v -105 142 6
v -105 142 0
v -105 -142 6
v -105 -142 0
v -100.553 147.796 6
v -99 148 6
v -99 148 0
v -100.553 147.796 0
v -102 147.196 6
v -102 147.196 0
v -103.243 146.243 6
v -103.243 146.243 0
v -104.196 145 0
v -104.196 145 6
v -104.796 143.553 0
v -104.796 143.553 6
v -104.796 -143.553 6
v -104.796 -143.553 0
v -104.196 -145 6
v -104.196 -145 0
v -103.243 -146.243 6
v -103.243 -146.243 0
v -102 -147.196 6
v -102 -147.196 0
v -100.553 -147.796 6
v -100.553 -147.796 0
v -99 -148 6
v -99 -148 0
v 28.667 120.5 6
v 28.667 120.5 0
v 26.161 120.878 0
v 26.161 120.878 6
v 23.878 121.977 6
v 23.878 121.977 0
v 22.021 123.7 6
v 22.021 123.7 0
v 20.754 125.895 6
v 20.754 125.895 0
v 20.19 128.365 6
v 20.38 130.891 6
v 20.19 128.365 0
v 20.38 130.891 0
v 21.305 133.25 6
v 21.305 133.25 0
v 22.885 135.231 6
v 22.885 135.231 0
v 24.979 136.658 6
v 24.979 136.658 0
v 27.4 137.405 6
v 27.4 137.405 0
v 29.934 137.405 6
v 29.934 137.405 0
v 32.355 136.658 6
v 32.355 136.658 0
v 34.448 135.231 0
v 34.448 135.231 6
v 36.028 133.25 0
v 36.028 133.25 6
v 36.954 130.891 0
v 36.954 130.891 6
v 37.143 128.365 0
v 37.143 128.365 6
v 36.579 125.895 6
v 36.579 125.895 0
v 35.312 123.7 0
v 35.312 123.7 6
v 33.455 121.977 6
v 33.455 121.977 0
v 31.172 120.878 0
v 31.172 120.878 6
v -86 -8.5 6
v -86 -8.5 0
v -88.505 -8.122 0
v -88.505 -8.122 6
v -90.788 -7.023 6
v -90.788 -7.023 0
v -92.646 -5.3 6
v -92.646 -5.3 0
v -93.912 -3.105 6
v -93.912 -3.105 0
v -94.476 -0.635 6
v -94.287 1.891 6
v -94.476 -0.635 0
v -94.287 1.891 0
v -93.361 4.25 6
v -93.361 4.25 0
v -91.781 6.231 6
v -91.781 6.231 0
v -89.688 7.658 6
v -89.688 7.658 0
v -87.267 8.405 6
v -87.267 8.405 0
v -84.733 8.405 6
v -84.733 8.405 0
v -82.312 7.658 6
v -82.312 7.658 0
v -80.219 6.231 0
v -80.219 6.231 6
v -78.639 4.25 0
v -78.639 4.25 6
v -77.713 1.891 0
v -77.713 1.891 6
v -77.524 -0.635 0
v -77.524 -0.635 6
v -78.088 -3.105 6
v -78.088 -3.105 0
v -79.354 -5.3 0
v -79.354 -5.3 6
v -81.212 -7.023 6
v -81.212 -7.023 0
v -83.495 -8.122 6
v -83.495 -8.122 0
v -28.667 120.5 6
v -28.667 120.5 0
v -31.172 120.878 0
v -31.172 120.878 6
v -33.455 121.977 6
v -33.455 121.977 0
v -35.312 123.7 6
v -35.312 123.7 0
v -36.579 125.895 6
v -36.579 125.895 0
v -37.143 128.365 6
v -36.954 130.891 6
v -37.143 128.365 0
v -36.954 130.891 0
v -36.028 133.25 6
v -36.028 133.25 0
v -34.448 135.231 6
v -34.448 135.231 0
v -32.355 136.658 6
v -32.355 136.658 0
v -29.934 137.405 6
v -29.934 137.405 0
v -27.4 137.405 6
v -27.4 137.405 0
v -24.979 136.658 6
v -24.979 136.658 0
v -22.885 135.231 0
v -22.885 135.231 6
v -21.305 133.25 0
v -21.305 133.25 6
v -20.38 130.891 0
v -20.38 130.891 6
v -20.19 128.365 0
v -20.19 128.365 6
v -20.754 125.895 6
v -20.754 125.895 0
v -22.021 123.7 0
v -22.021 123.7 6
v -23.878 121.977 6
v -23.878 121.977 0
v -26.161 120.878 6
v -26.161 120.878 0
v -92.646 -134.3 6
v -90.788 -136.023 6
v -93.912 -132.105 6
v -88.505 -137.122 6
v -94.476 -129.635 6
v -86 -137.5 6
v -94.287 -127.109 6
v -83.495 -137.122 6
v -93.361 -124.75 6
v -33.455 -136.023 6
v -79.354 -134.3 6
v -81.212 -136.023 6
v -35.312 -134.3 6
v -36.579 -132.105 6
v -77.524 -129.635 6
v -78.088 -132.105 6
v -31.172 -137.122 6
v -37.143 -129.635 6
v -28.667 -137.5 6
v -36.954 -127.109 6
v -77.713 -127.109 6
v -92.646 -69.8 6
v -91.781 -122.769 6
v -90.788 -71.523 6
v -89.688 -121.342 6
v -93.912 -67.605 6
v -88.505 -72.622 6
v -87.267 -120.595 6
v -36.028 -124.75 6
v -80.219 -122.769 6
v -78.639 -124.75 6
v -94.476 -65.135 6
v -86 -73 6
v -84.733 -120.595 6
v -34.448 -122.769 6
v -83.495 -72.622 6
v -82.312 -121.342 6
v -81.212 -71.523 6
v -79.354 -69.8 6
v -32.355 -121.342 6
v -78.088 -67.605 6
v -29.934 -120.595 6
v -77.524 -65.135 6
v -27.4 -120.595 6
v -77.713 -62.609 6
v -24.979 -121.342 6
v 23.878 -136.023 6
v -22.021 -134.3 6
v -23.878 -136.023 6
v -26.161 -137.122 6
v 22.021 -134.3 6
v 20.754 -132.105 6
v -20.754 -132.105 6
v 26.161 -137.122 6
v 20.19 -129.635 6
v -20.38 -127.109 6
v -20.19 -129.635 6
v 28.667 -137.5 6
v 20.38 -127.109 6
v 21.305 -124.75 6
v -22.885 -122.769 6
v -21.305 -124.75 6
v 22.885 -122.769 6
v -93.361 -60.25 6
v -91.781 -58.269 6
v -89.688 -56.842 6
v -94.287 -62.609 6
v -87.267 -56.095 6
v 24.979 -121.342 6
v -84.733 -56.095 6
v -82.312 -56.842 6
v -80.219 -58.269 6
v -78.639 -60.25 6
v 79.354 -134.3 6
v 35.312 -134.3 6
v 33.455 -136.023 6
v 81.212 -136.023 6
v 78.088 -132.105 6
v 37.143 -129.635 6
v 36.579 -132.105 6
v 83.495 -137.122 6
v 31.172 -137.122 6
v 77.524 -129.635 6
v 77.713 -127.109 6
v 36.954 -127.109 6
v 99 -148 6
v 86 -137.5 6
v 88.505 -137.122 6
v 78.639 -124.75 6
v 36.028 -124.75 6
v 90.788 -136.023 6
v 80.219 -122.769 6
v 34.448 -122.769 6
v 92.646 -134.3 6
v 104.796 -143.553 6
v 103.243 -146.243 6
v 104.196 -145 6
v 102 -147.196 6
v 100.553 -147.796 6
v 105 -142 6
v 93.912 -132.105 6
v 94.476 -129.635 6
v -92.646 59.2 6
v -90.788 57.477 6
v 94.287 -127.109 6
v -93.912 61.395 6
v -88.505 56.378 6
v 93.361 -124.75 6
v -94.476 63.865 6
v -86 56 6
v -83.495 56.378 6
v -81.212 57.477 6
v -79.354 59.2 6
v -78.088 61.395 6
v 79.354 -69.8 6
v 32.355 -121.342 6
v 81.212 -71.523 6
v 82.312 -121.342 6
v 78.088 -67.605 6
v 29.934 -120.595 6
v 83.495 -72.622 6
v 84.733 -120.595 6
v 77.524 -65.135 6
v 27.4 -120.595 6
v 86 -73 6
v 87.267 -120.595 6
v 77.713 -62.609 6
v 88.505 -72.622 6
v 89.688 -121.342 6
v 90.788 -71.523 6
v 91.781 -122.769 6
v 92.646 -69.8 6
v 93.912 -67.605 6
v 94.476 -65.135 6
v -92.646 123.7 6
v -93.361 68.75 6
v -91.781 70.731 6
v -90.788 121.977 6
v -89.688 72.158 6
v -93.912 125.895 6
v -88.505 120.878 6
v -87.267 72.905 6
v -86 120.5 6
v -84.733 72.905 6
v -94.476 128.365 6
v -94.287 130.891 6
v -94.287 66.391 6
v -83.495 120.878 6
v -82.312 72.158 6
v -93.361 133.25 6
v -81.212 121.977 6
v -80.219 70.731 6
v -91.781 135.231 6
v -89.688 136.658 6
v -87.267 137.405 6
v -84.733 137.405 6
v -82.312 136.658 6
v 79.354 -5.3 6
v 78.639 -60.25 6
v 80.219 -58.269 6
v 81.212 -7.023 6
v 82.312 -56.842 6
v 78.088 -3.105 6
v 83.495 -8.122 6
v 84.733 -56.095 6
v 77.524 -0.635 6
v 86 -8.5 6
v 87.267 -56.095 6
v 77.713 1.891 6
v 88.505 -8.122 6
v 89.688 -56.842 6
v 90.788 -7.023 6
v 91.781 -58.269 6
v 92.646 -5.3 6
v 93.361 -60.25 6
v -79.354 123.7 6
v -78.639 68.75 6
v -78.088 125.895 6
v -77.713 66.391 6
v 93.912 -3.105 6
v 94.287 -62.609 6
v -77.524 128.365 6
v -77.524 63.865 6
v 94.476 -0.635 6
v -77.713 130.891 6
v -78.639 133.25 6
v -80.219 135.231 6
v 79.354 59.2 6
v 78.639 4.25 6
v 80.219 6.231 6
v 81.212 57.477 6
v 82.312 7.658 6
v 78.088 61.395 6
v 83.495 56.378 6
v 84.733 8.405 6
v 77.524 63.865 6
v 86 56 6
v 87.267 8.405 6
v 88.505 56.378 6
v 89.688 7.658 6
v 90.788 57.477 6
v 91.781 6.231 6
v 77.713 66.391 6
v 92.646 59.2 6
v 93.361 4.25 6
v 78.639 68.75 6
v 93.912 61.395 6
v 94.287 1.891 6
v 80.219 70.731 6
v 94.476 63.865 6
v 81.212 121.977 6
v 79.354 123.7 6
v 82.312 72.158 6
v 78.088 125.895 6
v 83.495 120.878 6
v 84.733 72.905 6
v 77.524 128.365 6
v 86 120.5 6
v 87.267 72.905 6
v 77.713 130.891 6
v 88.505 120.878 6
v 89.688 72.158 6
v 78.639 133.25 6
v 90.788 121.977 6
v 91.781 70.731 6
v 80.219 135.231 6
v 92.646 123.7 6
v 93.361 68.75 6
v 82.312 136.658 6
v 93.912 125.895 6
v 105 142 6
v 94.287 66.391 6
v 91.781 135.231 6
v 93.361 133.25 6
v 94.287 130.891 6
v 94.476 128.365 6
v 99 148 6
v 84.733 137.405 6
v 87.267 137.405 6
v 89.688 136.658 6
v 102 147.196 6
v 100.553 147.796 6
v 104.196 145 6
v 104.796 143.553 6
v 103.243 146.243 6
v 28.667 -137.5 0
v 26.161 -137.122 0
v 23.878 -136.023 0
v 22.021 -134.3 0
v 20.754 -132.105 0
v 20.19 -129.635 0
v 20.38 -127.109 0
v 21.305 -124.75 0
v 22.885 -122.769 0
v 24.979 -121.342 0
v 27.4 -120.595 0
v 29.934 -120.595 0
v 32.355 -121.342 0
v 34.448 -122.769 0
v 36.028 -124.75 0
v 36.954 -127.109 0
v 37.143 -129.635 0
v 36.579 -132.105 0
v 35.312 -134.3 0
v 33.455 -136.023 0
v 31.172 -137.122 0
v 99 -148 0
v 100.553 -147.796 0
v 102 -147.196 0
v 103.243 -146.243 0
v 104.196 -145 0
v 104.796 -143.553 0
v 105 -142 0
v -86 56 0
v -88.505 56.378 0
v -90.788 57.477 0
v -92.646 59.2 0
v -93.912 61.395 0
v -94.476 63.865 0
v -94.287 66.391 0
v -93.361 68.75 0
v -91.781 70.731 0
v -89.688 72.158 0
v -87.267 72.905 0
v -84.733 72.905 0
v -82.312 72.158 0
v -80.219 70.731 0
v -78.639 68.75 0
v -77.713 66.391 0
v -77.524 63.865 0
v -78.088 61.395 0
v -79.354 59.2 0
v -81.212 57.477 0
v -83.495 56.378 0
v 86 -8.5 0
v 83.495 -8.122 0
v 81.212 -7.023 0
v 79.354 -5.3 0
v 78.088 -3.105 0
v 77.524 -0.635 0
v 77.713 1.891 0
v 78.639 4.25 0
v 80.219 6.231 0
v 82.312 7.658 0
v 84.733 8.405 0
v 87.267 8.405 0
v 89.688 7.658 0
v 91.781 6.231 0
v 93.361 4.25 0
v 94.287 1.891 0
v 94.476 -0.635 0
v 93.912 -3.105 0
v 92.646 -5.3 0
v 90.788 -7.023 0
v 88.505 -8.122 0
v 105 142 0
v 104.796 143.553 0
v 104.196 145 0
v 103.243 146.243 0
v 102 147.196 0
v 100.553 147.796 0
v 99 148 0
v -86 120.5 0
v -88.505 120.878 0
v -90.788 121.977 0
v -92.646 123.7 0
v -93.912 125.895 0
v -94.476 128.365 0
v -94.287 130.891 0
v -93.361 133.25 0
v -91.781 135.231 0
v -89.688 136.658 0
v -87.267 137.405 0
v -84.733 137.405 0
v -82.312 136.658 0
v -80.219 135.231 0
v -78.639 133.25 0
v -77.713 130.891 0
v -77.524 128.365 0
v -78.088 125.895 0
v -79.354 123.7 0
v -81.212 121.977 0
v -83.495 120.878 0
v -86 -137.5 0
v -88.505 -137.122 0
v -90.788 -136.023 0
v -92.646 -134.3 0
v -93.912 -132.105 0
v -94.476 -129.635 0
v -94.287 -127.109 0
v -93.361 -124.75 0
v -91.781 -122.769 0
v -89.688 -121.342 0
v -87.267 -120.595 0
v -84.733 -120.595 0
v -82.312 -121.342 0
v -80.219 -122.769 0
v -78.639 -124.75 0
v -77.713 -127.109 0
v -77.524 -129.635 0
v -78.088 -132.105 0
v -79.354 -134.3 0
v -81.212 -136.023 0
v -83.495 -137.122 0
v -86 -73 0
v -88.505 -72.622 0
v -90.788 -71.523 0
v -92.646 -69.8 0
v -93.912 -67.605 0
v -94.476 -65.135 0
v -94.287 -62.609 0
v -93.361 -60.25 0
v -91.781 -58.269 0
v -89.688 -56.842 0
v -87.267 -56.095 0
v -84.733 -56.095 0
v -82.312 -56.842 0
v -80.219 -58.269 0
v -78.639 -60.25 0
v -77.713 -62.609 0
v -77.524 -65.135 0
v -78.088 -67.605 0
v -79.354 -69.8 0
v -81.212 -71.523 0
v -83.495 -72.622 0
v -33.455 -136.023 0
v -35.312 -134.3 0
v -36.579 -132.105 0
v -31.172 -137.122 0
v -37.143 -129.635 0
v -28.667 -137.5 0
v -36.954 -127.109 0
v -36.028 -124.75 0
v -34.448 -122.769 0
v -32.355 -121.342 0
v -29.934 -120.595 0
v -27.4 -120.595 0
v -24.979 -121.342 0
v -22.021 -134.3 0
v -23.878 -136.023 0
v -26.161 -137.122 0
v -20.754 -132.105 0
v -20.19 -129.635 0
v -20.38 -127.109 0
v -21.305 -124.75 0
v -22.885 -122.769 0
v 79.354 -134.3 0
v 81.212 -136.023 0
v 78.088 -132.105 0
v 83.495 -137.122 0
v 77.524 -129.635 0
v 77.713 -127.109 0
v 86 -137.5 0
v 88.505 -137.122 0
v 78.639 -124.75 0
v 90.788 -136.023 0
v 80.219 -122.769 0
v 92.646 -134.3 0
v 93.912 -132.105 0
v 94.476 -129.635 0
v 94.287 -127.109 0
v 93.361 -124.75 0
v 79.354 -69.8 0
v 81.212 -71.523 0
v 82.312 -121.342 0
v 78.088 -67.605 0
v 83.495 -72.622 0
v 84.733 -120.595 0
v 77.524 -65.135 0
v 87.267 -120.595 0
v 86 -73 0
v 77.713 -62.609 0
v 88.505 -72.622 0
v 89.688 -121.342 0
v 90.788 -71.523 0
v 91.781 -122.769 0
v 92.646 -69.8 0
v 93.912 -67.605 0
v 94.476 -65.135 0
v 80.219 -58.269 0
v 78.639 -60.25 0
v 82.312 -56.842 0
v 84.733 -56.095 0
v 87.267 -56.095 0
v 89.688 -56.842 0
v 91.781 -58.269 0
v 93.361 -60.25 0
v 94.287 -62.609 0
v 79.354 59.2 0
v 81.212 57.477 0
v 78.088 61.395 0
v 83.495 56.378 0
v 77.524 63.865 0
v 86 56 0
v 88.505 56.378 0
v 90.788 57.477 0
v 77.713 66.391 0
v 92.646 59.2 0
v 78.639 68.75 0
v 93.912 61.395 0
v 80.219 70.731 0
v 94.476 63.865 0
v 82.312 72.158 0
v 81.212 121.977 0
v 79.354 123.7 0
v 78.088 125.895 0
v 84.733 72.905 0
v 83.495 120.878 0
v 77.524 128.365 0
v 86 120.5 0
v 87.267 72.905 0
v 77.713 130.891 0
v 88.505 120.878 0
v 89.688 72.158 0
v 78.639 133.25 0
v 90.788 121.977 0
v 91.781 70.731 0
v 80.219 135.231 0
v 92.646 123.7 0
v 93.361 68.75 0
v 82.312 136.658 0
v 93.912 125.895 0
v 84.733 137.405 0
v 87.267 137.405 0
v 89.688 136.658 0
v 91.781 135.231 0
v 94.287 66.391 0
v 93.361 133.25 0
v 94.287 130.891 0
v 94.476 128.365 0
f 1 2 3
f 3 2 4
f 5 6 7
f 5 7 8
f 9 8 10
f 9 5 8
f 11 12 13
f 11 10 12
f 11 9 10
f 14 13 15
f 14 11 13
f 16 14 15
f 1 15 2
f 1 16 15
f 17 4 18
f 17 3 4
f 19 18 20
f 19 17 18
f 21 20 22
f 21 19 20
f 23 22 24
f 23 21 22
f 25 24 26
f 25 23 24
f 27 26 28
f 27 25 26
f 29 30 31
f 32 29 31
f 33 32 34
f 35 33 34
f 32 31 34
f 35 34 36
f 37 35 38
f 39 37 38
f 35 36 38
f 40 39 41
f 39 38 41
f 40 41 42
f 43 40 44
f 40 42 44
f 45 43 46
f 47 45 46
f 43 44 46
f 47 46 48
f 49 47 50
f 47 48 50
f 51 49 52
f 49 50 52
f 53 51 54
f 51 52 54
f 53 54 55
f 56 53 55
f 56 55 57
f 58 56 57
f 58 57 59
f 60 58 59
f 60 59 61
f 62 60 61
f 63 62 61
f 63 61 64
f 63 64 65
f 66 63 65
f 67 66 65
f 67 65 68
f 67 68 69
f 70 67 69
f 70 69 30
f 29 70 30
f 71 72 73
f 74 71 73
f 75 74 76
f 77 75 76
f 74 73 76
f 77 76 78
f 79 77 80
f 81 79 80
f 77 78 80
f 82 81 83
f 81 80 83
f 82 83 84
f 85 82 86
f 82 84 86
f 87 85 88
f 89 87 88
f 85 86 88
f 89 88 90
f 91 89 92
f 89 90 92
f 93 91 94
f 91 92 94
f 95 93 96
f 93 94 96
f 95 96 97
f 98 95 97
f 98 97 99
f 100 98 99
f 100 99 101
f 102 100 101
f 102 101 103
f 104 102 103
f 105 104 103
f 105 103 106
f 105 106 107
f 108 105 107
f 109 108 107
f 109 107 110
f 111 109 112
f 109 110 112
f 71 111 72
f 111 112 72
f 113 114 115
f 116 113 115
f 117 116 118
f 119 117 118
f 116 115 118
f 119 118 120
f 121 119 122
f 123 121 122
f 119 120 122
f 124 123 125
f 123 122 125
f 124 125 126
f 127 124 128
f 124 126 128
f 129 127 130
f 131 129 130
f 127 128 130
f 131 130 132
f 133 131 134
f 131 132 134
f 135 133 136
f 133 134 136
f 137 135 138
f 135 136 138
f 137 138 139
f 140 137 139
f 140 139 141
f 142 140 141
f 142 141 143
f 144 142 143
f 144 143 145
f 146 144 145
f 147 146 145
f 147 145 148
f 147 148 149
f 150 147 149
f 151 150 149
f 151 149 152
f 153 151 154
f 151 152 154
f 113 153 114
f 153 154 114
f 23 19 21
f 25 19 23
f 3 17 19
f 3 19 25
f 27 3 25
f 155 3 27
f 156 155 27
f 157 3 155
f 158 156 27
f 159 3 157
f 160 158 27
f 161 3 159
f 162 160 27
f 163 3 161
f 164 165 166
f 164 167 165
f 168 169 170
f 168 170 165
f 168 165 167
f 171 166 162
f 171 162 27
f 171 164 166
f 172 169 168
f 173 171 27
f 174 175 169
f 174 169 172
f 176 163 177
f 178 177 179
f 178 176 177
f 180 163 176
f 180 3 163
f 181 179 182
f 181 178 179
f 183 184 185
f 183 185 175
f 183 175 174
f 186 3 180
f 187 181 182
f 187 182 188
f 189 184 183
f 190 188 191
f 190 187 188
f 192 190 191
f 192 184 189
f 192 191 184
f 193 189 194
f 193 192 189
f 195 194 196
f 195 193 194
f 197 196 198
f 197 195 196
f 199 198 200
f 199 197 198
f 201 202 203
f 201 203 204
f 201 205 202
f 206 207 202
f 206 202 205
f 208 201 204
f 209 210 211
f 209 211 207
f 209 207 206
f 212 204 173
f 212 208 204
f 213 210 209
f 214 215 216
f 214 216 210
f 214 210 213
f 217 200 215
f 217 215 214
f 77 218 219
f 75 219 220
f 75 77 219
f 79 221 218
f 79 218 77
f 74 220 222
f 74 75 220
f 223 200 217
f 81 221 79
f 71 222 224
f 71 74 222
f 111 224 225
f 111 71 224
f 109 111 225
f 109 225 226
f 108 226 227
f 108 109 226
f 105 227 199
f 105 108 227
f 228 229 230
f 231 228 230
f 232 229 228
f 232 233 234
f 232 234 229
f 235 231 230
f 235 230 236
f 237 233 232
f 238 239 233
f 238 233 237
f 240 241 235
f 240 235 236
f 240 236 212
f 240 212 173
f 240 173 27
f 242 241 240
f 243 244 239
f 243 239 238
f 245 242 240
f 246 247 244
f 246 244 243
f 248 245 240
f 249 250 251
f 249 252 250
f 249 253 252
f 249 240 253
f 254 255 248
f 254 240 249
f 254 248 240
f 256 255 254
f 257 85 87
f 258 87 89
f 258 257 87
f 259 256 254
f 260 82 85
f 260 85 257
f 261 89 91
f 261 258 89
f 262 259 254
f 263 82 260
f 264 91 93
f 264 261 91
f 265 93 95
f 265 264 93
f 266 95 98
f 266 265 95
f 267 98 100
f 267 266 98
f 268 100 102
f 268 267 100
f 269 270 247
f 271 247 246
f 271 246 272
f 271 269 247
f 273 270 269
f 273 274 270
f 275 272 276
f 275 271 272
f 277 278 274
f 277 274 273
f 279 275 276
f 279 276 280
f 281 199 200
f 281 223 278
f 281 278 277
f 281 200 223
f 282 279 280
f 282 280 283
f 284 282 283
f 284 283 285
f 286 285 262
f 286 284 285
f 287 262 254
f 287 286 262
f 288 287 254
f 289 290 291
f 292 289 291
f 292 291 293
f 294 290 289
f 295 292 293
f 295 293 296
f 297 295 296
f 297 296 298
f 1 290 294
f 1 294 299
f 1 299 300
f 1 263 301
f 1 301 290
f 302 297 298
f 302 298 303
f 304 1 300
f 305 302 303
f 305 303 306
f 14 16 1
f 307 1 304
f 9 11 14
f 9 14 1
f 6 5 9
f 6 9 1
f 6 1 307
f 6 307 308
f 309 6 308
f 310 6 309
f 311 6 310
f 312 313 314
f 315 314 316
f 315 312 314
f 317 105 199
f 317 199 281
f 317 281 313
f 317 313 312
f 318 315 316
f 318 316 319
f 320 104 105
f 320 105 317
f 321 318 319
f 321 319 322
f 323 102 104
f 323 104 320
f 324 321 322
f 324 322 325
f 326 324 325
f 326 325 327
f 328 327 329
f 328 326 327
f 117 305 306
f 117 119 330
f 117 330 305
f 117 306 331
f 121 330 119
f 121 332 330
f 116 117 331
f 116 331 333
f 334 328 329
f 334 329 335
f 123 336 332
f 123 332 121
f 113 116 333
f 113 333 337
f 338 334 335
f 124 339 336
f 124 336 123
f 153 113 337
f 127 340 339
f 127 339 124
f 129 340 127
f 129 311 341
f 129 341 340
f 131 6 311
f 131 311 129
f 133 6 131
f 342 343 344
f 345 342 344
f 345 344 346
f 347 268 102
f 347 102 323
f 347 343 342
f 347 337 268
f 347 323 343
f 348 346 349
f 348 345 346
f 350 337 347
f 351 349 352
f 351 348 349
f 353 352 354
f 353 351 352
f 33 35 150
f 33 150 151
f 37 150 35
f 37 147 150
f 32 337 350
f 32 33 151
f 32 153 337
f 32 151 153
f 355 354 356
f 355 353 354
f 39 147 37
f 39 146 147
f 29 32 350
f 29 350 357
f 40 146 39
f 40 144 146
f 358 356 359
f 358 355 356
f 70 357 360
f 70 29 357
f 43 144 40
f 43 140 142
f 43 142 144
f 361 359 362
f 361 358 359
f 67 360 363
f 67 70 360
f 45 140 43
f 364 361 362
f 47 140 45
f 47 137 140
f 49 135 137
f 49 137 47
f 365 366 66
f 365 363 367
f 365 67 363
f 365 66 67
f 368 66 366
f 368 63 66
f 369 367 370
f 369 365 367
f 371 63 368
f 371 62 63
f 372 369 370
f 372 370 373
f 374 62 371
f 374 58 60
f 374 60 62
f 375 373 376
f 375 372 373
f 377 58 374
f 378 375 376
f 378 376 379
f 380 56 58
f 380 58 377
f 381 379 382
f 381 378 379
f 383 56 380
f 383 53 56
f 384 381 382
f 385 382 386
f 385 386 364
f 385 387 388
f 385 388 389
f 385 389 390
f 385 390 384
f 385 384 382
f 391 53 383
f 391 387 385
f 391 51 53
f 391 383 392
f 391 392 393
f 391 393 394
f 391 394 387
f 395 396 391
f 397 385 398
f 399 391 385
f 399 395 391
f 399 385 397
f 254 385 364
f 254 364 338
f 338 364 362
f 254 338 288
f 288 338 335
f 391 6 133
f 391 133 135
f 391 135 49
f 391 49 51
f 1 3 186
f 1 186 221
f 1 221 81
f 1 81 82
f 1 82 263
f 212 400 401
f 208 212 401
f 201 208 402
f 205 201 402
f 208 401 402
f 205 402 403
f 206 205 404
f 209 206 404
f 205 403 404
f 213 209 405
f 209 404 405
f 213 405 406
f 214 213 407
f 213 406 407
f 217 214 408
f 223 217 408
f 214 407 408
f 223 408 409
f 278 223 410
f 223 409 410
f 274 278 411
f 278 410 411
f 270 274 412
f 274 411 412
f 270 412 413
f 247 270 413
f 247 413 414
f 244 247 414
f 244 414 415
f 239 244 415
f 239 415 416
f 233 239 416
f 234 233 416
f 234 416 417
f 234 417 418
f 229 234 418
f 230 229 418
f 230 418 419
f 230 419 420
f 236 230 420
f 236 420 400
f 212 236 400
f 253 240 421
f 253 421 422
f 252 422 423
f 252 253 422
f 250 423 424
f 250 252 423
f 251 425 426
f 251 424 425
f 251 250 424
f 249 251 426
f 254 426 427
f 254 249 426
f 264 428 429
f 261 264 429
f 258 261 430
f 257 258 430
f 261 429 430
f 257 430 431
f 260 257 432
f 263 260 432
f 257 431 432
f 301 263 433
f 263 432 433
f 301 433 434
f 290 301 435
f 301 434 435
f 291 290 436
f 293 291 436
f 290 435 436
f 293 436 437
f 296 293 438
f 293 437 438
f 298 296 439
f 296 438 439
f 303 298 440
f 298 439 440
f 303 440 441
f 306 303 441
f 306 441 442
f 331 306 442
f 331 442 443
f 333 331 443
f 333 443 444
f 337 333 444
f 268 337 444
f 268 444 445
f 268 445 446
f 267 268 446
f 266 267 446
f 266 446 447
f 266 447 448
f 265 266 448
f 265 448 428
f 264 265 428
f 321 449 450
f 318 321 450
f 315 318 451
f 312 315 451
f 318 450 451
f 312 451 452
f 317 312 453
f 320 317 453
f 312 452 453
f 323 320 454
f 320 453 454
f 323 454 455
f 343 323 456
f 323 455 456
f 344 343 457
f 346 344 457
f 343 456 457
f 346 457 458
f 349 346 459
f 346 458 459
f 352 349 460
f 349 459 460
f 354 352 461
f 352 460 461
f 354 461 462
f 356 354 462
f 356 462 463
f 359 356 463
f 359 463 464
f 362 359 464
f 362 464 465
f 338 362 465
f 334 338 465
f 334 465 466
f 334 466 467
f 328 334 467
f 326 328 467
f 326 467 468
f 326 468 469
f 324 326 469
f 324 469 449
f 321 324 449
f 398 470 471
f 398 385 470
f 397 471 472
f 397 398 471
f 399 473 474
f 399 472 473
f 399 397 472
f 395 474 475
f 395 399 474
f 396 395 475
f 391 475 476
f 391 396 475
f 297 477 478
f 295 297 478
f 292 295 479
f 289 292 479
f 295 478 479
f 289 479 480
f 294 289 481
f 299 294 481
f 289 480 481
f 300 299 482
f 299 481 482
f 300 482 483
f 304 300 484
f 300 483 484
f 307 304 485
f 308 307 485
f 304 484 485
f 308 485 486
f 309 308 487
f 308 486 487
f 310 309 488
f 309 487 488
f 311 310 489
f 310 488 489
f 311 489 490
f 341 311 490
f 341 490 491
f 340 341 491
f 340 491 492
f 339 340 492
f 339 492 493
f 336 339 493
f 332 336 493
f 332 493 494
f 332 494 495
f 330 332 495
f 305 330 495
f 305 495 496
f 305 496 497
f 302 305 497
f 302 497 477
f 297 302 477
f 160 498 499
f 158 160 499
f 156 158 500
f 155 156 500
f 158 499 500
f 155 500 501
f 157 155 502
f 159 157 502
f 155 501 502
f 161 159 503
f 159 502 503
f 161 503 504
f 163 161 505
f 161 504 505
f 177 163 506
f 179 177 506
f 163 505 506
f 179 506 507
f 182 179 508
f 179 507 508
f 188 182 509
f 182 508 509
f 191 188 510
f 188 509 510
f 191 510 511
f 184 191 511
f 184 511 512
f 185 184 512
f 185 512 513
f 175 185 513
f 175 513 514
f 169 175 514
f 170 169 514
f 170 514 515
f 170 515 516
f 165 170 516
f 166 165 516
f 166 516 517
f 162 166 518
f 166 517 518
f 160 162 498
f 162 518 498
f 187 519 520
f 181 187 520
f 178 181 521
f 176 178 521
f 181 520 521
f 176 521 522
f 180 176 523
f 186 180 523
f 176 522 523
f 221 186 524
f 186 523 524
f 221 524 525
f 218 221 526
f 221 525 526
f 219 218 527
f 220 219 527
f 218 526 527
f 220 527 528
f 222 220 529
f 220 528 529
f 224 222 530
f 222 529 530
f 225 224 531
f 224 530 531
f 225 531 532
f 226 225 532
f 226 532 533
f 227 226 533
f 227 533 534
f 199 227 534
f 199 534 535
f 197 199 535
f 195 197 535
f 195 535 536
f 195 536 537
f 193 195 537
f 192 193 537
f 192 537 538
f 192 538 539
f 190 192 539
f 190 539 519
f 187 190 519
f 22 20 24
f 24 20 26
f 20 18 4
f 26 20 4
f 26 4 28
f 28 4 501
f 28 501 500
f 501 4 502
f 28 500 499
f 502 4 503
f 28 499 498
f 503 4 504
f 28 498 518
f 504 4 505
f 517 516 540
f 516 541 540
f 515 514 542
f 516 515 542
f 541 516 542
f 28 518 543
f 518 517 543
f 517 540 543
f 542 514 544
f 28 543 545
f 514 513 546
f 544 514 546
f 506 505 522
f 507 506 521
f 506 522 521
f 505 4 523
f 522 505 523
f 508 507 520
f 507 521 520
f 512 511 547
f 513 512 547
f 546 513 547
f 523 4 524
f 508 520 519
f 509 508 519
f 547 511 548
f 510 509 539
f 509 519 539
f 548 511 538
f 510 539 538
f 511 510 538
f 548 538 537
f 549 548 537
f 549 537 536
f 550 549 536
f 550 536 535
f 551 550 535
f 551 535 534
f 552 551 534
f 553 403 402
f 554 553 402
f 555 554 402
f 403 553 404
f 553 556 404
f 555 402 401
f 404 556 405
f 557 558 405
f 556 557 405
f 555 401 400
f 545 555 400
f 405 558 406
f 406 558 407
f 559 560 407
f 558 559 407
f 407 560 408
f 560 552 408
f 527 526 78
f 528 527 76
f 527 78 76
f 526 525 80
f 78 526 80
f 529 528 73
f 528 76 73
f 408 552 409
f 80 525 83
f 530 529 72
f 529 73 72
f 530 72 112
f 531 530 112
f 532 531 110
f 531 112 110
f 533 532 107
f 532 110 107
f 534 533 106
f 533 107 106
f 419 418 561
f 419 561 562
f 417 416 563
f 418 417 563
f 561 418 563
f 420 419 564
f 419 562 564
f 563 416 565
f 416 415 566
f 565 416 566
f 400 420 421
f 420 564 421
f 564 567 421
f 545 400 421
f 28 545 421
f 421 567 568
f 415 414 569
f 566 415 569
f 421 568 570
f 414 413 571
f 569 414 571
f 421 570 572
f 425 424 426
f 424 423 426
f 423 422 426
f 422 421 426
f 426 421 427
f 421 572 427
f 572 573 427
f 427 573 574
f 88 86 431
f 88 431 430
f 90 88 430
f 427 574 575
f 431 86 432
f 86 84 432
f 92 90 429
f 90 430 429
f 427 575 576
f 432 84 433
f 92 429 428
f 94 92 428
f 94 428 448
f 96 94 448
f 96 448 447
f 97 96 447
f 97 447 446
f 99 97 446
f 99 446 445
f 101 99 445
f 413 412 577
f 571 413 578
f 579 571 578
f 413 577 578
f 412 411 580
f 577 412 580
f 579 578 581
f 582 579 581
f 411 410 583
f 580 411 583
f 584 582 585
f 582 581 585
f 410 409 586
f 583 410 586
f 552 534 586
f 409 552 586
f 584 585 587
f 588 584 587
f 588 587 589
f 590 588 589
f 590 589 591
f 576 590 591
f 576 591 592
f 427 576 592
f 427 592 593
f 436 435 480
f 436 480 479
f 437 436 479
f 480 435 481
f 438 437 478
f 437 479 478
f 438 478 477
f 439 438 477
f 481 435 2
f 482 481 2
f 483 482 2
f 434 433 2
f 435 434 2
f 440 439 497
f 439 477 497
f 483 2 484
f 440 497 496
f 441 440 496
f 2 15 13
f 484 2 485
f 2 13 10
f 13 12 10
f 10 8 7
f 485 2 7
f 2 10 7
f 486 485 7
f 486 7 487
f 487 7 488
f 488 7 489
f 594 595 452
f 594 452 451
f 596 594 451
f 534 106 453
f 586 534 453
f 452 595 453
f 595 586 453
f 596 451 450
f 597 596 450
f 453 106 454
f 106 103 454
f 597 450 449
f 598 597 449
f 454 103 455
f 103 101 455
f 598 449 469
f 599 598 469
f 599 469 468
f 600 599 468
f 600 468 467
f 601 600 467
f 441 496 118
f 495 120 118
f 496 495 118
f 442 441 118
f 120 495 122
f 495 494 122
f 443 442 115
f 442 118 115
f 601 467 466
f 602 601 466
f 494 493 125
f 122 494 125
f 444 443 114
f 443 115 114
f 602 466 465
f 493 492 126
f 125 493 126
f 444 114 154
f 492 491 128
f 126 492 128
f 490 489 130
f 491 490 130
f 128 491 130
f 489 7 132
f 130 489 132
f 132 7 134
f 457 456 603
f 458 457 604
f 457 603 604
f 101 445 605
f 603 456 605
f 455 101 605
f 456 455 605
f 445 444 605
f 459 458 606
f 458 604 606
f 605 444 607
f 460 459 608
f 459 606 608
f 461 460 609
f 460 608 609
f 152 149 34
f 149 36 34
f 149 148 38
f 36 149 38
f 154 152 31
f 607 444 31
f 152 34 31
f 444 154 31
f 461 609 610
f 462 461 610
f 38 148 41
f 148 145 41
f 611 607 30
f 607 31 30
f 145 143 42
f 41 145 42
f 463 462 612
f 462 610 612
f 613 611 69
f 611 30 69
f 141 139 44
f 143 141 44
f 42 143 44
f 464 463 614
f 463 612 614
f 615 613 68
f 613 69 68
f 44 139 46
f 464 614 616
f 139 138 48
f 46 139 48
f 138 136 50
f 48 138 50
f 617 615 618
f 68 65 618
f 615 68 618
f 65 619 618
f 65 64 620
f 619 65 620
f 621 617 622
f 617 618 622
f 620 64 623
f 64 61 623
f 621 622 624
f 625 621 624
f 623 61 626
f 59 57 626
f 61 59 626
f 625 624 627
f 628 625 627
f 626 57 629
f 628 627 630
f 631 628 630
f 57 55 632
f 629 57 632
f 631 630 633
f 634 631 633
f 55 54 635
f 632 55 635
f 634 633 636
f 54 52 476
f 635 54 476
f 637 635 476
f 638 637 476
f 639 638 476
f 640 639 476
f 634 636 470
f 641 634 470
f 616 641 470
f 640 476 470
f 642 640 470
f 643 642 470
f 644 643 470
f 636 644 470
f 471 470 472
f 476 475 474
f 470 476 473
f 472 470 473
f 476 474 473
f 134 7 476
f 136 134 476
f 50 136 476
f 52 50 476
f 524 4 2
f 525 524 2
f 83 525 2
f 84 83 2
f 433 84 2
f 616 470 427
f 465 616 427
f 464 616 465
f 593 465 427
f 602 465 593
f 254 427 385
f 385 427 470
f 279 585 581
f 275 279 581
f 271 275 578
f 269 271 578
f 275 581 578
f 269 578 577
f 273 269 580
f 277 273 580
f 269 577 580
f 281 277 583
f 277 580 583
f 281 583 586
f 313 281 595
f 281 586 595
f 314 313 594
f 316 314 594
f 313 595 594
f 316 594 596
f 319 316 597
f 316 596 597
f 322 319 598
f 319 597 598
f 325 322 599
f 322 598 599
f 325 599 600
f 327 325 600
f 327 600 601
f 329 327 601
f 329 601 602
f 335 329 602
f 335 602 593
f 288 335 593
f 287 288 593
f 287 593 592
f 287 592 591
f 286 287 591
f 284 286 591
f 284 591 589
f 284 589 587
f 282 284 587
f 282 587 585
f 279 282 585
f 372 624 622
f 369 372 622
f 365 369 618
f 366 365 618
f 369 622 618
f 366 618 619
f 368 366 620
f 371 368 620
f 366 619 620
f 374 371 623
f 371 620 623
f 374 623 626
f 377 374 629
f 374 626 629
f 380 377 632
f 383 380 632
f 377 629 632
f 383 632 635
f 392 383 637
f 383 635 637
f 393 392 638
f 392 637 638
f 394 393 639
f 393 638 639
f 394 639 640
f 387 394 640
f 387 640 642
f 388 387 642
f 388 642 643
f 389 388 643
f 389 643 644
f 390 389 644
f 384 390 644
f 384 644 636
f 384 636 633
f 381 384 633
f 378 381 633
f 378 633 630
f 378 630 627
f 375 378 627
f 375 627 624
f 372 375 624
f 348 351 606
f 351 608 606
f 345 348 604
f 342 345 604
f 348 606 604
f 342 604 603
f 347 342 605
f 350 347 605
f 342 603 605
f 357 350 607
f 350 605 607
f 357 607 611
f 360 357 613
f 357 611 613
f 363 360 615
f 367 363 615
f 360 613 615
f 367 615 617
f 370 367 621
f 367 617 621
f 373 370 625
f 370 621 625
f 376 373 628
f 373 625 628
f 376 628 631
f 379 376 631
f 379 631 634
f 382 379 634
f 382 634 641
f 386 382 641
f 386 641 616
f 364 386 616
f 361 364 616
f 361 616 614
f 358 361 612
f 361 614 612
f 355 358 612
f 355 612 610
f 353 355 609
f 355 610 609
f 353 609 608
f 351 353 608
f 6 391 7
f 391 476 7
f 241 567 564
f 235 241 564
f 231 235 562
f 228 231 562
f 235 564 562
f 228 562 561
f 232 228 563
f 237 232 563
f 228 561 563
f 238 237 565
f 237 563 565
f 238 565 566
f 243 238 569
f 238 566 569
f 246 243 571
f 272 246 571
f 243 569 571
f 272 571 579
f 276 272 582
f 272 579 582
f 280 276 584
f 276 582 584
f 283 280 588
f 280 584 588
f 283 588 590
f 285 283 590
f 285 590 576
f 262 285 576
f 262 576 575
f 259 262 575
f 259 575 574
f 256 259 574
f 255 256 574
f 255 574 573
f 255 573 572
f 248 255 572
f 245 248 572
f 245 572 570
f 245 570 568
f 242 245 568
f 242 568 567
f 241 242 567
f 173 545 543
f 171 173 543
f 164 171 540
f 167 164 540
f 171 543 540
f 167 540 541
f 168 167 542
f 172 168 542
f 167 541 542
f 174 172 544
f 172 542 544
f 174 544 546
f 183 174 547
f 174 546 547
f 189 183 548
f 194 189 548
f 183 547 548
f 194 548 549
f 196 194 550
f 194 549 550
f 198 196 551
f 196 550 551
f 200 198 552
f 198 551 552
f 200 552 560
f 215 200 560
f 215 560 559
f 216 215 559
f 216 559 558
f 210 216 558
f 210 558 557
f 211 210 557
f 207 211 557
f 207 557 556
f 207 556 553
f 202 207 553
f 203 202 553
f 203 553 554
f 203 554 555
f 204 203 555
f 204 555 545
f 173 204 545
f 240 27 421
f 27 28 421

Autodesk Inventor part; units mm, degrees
ref_plane "YZ Plane" through (0, 0, 0) normal (1, 0, 0) x (0, 1, 0)
ref_plane "XZ Plane" through (0, 0, 0) normal (0, 1, 0) x (-1, 0, 0)
ref_plane "XY Plane" through (0, 0, 0) normal (0, 0, 1) x (1, 0, 0)
sketch "Sketch2" plane through (0, 0, 0) normal (0, 0, 1) x (1, 0, 0)
  line L0 (-55, -98) -> (55, -98)
  line L1 (55, -98) -> (55, 98)
  line L2 (55, 98) -> (-55, 98)
  line L3 (-55, 98) -> (-55, -98)
  line L4 (-55, -98) -> (55, 98) construction
  line L5 (55, -98) -> (-55, 98) construction
  line L6 (-105, -148) -> (105, -148)
  line L7 (105, -148) -> (105, 148)
  line L8 (105, 148) -> (-105, 148)
  line L9 (-105, 148) -> (-105, -148)
  point P0 (0, 0)
  dimension "d31" = 50
  dimension "d60" = 196
  dimension "d61" = 110
extrude "Plate2" add sketch "Sketch2" along normal blind 6 contours L3 L2 L1 L0 | L9 L8 L7 L6
sketch "Sketch5" plane through (0, 0, 6) normal (0, 0, 1) x (1, 0, 0)
  line L0 (105, -148) -> (-105, -148) construction
  line L1 (105, 148) -> (105, -148) construction
  line L2 (-105, 148) -> (105, 148) construction
  line L3 (-105, -148) -> (-105, 148) construction
  line L4 (-86, 129) -> (86, 129) construction
  line L5 (86, 129) -> (86, -129) construction
  line L6 (86, -129) -> (-86, -129) construction
  line L7 (-86, -129) -> (-86, 129) construction
  line L8 (-28.6667, -129) -> (28.6667, -129)
  line L9 (28.6667, -129) -> (28.6667, 129) construction
  line L10 (28.6667, 129) -> (-28.6667, 129)
  line L11 (-28.6667, 129) -> (-28.6667, -129) construction
  line L12 (-28.6667, 0) -> (28.6667, 0) construction
  point P0 (0, 0)
  point P1 (0, -129)
  point P2 (-86, -64.5)
  point P3 (-86, 0)
  point P4 (-86, 64.5)
  point P5 (86, 64.5)
  point P6 (86, 0)
  point P7 (86, -64.5)
  point P8 (0, 0)
  dimension "d34" = 19
  dimension "d47" = 64.5
  dimension "d48" = 64.5
  dimension "d49" = 57.3333
  dimension "d50" = 57.3333
fillet "Corner Round1" radius 6 4 edges at (-105, -148, 3) (-105, 148, 3) (105, 148, 3) (105, -148, 3)
hole "Hole1" at (-86, -129, 6) at (-86, -64.5, 6) at (-86, 0, 6) at (-86, 64.5, 6) at (-86, 129, 6) at (86, 129, 6) at (86, 64.5, 6) at (86, 0, 6) at (86, -64.5, 6) at (86, -129, 6) at (-28.6667, -129, 6) at (28.6667, 129, 6) at (28.6667, -129, 6) at (-28.6667, 129, 6) direction (0, 0, -1) diameter 17 end through all
equation "\"d47\" = d48"
equation "\"d49\" = d50"
equation "\"d60\" = ChargingHatch_width - 2 * Thickness"
equation "\"d61\" = ChargingHatch_hight - 2 * Thickness"
equation "\"d56\" = Thickness"
equation "\"d14\" = Thickness"
equation "\"BendReliefWidth\" = Thickness"
equation "\"BendReliefDepth\" = 0.5 * Thickness"
equation "\"CornerReliefSize\" = 4 * Thickness"
equation "\"MinimumRemnant\" = 2 * Thickness"
equation "\"TransitionRadius\" = BendRadius"
equation "\"JacobiRadiusSize\" = BendRadius"
equation "\"GapSize\" = Thickness"
equation "\"ChargingHatch_width\" = 208"
equation "\"Thickness\" = 6"
equation "\"ChargingHatch_hight\" = 122"
equation "\"BendRadius\" = 6"
properties part number "PRS 9607 charging flange rect_D1200" material "Steel"
